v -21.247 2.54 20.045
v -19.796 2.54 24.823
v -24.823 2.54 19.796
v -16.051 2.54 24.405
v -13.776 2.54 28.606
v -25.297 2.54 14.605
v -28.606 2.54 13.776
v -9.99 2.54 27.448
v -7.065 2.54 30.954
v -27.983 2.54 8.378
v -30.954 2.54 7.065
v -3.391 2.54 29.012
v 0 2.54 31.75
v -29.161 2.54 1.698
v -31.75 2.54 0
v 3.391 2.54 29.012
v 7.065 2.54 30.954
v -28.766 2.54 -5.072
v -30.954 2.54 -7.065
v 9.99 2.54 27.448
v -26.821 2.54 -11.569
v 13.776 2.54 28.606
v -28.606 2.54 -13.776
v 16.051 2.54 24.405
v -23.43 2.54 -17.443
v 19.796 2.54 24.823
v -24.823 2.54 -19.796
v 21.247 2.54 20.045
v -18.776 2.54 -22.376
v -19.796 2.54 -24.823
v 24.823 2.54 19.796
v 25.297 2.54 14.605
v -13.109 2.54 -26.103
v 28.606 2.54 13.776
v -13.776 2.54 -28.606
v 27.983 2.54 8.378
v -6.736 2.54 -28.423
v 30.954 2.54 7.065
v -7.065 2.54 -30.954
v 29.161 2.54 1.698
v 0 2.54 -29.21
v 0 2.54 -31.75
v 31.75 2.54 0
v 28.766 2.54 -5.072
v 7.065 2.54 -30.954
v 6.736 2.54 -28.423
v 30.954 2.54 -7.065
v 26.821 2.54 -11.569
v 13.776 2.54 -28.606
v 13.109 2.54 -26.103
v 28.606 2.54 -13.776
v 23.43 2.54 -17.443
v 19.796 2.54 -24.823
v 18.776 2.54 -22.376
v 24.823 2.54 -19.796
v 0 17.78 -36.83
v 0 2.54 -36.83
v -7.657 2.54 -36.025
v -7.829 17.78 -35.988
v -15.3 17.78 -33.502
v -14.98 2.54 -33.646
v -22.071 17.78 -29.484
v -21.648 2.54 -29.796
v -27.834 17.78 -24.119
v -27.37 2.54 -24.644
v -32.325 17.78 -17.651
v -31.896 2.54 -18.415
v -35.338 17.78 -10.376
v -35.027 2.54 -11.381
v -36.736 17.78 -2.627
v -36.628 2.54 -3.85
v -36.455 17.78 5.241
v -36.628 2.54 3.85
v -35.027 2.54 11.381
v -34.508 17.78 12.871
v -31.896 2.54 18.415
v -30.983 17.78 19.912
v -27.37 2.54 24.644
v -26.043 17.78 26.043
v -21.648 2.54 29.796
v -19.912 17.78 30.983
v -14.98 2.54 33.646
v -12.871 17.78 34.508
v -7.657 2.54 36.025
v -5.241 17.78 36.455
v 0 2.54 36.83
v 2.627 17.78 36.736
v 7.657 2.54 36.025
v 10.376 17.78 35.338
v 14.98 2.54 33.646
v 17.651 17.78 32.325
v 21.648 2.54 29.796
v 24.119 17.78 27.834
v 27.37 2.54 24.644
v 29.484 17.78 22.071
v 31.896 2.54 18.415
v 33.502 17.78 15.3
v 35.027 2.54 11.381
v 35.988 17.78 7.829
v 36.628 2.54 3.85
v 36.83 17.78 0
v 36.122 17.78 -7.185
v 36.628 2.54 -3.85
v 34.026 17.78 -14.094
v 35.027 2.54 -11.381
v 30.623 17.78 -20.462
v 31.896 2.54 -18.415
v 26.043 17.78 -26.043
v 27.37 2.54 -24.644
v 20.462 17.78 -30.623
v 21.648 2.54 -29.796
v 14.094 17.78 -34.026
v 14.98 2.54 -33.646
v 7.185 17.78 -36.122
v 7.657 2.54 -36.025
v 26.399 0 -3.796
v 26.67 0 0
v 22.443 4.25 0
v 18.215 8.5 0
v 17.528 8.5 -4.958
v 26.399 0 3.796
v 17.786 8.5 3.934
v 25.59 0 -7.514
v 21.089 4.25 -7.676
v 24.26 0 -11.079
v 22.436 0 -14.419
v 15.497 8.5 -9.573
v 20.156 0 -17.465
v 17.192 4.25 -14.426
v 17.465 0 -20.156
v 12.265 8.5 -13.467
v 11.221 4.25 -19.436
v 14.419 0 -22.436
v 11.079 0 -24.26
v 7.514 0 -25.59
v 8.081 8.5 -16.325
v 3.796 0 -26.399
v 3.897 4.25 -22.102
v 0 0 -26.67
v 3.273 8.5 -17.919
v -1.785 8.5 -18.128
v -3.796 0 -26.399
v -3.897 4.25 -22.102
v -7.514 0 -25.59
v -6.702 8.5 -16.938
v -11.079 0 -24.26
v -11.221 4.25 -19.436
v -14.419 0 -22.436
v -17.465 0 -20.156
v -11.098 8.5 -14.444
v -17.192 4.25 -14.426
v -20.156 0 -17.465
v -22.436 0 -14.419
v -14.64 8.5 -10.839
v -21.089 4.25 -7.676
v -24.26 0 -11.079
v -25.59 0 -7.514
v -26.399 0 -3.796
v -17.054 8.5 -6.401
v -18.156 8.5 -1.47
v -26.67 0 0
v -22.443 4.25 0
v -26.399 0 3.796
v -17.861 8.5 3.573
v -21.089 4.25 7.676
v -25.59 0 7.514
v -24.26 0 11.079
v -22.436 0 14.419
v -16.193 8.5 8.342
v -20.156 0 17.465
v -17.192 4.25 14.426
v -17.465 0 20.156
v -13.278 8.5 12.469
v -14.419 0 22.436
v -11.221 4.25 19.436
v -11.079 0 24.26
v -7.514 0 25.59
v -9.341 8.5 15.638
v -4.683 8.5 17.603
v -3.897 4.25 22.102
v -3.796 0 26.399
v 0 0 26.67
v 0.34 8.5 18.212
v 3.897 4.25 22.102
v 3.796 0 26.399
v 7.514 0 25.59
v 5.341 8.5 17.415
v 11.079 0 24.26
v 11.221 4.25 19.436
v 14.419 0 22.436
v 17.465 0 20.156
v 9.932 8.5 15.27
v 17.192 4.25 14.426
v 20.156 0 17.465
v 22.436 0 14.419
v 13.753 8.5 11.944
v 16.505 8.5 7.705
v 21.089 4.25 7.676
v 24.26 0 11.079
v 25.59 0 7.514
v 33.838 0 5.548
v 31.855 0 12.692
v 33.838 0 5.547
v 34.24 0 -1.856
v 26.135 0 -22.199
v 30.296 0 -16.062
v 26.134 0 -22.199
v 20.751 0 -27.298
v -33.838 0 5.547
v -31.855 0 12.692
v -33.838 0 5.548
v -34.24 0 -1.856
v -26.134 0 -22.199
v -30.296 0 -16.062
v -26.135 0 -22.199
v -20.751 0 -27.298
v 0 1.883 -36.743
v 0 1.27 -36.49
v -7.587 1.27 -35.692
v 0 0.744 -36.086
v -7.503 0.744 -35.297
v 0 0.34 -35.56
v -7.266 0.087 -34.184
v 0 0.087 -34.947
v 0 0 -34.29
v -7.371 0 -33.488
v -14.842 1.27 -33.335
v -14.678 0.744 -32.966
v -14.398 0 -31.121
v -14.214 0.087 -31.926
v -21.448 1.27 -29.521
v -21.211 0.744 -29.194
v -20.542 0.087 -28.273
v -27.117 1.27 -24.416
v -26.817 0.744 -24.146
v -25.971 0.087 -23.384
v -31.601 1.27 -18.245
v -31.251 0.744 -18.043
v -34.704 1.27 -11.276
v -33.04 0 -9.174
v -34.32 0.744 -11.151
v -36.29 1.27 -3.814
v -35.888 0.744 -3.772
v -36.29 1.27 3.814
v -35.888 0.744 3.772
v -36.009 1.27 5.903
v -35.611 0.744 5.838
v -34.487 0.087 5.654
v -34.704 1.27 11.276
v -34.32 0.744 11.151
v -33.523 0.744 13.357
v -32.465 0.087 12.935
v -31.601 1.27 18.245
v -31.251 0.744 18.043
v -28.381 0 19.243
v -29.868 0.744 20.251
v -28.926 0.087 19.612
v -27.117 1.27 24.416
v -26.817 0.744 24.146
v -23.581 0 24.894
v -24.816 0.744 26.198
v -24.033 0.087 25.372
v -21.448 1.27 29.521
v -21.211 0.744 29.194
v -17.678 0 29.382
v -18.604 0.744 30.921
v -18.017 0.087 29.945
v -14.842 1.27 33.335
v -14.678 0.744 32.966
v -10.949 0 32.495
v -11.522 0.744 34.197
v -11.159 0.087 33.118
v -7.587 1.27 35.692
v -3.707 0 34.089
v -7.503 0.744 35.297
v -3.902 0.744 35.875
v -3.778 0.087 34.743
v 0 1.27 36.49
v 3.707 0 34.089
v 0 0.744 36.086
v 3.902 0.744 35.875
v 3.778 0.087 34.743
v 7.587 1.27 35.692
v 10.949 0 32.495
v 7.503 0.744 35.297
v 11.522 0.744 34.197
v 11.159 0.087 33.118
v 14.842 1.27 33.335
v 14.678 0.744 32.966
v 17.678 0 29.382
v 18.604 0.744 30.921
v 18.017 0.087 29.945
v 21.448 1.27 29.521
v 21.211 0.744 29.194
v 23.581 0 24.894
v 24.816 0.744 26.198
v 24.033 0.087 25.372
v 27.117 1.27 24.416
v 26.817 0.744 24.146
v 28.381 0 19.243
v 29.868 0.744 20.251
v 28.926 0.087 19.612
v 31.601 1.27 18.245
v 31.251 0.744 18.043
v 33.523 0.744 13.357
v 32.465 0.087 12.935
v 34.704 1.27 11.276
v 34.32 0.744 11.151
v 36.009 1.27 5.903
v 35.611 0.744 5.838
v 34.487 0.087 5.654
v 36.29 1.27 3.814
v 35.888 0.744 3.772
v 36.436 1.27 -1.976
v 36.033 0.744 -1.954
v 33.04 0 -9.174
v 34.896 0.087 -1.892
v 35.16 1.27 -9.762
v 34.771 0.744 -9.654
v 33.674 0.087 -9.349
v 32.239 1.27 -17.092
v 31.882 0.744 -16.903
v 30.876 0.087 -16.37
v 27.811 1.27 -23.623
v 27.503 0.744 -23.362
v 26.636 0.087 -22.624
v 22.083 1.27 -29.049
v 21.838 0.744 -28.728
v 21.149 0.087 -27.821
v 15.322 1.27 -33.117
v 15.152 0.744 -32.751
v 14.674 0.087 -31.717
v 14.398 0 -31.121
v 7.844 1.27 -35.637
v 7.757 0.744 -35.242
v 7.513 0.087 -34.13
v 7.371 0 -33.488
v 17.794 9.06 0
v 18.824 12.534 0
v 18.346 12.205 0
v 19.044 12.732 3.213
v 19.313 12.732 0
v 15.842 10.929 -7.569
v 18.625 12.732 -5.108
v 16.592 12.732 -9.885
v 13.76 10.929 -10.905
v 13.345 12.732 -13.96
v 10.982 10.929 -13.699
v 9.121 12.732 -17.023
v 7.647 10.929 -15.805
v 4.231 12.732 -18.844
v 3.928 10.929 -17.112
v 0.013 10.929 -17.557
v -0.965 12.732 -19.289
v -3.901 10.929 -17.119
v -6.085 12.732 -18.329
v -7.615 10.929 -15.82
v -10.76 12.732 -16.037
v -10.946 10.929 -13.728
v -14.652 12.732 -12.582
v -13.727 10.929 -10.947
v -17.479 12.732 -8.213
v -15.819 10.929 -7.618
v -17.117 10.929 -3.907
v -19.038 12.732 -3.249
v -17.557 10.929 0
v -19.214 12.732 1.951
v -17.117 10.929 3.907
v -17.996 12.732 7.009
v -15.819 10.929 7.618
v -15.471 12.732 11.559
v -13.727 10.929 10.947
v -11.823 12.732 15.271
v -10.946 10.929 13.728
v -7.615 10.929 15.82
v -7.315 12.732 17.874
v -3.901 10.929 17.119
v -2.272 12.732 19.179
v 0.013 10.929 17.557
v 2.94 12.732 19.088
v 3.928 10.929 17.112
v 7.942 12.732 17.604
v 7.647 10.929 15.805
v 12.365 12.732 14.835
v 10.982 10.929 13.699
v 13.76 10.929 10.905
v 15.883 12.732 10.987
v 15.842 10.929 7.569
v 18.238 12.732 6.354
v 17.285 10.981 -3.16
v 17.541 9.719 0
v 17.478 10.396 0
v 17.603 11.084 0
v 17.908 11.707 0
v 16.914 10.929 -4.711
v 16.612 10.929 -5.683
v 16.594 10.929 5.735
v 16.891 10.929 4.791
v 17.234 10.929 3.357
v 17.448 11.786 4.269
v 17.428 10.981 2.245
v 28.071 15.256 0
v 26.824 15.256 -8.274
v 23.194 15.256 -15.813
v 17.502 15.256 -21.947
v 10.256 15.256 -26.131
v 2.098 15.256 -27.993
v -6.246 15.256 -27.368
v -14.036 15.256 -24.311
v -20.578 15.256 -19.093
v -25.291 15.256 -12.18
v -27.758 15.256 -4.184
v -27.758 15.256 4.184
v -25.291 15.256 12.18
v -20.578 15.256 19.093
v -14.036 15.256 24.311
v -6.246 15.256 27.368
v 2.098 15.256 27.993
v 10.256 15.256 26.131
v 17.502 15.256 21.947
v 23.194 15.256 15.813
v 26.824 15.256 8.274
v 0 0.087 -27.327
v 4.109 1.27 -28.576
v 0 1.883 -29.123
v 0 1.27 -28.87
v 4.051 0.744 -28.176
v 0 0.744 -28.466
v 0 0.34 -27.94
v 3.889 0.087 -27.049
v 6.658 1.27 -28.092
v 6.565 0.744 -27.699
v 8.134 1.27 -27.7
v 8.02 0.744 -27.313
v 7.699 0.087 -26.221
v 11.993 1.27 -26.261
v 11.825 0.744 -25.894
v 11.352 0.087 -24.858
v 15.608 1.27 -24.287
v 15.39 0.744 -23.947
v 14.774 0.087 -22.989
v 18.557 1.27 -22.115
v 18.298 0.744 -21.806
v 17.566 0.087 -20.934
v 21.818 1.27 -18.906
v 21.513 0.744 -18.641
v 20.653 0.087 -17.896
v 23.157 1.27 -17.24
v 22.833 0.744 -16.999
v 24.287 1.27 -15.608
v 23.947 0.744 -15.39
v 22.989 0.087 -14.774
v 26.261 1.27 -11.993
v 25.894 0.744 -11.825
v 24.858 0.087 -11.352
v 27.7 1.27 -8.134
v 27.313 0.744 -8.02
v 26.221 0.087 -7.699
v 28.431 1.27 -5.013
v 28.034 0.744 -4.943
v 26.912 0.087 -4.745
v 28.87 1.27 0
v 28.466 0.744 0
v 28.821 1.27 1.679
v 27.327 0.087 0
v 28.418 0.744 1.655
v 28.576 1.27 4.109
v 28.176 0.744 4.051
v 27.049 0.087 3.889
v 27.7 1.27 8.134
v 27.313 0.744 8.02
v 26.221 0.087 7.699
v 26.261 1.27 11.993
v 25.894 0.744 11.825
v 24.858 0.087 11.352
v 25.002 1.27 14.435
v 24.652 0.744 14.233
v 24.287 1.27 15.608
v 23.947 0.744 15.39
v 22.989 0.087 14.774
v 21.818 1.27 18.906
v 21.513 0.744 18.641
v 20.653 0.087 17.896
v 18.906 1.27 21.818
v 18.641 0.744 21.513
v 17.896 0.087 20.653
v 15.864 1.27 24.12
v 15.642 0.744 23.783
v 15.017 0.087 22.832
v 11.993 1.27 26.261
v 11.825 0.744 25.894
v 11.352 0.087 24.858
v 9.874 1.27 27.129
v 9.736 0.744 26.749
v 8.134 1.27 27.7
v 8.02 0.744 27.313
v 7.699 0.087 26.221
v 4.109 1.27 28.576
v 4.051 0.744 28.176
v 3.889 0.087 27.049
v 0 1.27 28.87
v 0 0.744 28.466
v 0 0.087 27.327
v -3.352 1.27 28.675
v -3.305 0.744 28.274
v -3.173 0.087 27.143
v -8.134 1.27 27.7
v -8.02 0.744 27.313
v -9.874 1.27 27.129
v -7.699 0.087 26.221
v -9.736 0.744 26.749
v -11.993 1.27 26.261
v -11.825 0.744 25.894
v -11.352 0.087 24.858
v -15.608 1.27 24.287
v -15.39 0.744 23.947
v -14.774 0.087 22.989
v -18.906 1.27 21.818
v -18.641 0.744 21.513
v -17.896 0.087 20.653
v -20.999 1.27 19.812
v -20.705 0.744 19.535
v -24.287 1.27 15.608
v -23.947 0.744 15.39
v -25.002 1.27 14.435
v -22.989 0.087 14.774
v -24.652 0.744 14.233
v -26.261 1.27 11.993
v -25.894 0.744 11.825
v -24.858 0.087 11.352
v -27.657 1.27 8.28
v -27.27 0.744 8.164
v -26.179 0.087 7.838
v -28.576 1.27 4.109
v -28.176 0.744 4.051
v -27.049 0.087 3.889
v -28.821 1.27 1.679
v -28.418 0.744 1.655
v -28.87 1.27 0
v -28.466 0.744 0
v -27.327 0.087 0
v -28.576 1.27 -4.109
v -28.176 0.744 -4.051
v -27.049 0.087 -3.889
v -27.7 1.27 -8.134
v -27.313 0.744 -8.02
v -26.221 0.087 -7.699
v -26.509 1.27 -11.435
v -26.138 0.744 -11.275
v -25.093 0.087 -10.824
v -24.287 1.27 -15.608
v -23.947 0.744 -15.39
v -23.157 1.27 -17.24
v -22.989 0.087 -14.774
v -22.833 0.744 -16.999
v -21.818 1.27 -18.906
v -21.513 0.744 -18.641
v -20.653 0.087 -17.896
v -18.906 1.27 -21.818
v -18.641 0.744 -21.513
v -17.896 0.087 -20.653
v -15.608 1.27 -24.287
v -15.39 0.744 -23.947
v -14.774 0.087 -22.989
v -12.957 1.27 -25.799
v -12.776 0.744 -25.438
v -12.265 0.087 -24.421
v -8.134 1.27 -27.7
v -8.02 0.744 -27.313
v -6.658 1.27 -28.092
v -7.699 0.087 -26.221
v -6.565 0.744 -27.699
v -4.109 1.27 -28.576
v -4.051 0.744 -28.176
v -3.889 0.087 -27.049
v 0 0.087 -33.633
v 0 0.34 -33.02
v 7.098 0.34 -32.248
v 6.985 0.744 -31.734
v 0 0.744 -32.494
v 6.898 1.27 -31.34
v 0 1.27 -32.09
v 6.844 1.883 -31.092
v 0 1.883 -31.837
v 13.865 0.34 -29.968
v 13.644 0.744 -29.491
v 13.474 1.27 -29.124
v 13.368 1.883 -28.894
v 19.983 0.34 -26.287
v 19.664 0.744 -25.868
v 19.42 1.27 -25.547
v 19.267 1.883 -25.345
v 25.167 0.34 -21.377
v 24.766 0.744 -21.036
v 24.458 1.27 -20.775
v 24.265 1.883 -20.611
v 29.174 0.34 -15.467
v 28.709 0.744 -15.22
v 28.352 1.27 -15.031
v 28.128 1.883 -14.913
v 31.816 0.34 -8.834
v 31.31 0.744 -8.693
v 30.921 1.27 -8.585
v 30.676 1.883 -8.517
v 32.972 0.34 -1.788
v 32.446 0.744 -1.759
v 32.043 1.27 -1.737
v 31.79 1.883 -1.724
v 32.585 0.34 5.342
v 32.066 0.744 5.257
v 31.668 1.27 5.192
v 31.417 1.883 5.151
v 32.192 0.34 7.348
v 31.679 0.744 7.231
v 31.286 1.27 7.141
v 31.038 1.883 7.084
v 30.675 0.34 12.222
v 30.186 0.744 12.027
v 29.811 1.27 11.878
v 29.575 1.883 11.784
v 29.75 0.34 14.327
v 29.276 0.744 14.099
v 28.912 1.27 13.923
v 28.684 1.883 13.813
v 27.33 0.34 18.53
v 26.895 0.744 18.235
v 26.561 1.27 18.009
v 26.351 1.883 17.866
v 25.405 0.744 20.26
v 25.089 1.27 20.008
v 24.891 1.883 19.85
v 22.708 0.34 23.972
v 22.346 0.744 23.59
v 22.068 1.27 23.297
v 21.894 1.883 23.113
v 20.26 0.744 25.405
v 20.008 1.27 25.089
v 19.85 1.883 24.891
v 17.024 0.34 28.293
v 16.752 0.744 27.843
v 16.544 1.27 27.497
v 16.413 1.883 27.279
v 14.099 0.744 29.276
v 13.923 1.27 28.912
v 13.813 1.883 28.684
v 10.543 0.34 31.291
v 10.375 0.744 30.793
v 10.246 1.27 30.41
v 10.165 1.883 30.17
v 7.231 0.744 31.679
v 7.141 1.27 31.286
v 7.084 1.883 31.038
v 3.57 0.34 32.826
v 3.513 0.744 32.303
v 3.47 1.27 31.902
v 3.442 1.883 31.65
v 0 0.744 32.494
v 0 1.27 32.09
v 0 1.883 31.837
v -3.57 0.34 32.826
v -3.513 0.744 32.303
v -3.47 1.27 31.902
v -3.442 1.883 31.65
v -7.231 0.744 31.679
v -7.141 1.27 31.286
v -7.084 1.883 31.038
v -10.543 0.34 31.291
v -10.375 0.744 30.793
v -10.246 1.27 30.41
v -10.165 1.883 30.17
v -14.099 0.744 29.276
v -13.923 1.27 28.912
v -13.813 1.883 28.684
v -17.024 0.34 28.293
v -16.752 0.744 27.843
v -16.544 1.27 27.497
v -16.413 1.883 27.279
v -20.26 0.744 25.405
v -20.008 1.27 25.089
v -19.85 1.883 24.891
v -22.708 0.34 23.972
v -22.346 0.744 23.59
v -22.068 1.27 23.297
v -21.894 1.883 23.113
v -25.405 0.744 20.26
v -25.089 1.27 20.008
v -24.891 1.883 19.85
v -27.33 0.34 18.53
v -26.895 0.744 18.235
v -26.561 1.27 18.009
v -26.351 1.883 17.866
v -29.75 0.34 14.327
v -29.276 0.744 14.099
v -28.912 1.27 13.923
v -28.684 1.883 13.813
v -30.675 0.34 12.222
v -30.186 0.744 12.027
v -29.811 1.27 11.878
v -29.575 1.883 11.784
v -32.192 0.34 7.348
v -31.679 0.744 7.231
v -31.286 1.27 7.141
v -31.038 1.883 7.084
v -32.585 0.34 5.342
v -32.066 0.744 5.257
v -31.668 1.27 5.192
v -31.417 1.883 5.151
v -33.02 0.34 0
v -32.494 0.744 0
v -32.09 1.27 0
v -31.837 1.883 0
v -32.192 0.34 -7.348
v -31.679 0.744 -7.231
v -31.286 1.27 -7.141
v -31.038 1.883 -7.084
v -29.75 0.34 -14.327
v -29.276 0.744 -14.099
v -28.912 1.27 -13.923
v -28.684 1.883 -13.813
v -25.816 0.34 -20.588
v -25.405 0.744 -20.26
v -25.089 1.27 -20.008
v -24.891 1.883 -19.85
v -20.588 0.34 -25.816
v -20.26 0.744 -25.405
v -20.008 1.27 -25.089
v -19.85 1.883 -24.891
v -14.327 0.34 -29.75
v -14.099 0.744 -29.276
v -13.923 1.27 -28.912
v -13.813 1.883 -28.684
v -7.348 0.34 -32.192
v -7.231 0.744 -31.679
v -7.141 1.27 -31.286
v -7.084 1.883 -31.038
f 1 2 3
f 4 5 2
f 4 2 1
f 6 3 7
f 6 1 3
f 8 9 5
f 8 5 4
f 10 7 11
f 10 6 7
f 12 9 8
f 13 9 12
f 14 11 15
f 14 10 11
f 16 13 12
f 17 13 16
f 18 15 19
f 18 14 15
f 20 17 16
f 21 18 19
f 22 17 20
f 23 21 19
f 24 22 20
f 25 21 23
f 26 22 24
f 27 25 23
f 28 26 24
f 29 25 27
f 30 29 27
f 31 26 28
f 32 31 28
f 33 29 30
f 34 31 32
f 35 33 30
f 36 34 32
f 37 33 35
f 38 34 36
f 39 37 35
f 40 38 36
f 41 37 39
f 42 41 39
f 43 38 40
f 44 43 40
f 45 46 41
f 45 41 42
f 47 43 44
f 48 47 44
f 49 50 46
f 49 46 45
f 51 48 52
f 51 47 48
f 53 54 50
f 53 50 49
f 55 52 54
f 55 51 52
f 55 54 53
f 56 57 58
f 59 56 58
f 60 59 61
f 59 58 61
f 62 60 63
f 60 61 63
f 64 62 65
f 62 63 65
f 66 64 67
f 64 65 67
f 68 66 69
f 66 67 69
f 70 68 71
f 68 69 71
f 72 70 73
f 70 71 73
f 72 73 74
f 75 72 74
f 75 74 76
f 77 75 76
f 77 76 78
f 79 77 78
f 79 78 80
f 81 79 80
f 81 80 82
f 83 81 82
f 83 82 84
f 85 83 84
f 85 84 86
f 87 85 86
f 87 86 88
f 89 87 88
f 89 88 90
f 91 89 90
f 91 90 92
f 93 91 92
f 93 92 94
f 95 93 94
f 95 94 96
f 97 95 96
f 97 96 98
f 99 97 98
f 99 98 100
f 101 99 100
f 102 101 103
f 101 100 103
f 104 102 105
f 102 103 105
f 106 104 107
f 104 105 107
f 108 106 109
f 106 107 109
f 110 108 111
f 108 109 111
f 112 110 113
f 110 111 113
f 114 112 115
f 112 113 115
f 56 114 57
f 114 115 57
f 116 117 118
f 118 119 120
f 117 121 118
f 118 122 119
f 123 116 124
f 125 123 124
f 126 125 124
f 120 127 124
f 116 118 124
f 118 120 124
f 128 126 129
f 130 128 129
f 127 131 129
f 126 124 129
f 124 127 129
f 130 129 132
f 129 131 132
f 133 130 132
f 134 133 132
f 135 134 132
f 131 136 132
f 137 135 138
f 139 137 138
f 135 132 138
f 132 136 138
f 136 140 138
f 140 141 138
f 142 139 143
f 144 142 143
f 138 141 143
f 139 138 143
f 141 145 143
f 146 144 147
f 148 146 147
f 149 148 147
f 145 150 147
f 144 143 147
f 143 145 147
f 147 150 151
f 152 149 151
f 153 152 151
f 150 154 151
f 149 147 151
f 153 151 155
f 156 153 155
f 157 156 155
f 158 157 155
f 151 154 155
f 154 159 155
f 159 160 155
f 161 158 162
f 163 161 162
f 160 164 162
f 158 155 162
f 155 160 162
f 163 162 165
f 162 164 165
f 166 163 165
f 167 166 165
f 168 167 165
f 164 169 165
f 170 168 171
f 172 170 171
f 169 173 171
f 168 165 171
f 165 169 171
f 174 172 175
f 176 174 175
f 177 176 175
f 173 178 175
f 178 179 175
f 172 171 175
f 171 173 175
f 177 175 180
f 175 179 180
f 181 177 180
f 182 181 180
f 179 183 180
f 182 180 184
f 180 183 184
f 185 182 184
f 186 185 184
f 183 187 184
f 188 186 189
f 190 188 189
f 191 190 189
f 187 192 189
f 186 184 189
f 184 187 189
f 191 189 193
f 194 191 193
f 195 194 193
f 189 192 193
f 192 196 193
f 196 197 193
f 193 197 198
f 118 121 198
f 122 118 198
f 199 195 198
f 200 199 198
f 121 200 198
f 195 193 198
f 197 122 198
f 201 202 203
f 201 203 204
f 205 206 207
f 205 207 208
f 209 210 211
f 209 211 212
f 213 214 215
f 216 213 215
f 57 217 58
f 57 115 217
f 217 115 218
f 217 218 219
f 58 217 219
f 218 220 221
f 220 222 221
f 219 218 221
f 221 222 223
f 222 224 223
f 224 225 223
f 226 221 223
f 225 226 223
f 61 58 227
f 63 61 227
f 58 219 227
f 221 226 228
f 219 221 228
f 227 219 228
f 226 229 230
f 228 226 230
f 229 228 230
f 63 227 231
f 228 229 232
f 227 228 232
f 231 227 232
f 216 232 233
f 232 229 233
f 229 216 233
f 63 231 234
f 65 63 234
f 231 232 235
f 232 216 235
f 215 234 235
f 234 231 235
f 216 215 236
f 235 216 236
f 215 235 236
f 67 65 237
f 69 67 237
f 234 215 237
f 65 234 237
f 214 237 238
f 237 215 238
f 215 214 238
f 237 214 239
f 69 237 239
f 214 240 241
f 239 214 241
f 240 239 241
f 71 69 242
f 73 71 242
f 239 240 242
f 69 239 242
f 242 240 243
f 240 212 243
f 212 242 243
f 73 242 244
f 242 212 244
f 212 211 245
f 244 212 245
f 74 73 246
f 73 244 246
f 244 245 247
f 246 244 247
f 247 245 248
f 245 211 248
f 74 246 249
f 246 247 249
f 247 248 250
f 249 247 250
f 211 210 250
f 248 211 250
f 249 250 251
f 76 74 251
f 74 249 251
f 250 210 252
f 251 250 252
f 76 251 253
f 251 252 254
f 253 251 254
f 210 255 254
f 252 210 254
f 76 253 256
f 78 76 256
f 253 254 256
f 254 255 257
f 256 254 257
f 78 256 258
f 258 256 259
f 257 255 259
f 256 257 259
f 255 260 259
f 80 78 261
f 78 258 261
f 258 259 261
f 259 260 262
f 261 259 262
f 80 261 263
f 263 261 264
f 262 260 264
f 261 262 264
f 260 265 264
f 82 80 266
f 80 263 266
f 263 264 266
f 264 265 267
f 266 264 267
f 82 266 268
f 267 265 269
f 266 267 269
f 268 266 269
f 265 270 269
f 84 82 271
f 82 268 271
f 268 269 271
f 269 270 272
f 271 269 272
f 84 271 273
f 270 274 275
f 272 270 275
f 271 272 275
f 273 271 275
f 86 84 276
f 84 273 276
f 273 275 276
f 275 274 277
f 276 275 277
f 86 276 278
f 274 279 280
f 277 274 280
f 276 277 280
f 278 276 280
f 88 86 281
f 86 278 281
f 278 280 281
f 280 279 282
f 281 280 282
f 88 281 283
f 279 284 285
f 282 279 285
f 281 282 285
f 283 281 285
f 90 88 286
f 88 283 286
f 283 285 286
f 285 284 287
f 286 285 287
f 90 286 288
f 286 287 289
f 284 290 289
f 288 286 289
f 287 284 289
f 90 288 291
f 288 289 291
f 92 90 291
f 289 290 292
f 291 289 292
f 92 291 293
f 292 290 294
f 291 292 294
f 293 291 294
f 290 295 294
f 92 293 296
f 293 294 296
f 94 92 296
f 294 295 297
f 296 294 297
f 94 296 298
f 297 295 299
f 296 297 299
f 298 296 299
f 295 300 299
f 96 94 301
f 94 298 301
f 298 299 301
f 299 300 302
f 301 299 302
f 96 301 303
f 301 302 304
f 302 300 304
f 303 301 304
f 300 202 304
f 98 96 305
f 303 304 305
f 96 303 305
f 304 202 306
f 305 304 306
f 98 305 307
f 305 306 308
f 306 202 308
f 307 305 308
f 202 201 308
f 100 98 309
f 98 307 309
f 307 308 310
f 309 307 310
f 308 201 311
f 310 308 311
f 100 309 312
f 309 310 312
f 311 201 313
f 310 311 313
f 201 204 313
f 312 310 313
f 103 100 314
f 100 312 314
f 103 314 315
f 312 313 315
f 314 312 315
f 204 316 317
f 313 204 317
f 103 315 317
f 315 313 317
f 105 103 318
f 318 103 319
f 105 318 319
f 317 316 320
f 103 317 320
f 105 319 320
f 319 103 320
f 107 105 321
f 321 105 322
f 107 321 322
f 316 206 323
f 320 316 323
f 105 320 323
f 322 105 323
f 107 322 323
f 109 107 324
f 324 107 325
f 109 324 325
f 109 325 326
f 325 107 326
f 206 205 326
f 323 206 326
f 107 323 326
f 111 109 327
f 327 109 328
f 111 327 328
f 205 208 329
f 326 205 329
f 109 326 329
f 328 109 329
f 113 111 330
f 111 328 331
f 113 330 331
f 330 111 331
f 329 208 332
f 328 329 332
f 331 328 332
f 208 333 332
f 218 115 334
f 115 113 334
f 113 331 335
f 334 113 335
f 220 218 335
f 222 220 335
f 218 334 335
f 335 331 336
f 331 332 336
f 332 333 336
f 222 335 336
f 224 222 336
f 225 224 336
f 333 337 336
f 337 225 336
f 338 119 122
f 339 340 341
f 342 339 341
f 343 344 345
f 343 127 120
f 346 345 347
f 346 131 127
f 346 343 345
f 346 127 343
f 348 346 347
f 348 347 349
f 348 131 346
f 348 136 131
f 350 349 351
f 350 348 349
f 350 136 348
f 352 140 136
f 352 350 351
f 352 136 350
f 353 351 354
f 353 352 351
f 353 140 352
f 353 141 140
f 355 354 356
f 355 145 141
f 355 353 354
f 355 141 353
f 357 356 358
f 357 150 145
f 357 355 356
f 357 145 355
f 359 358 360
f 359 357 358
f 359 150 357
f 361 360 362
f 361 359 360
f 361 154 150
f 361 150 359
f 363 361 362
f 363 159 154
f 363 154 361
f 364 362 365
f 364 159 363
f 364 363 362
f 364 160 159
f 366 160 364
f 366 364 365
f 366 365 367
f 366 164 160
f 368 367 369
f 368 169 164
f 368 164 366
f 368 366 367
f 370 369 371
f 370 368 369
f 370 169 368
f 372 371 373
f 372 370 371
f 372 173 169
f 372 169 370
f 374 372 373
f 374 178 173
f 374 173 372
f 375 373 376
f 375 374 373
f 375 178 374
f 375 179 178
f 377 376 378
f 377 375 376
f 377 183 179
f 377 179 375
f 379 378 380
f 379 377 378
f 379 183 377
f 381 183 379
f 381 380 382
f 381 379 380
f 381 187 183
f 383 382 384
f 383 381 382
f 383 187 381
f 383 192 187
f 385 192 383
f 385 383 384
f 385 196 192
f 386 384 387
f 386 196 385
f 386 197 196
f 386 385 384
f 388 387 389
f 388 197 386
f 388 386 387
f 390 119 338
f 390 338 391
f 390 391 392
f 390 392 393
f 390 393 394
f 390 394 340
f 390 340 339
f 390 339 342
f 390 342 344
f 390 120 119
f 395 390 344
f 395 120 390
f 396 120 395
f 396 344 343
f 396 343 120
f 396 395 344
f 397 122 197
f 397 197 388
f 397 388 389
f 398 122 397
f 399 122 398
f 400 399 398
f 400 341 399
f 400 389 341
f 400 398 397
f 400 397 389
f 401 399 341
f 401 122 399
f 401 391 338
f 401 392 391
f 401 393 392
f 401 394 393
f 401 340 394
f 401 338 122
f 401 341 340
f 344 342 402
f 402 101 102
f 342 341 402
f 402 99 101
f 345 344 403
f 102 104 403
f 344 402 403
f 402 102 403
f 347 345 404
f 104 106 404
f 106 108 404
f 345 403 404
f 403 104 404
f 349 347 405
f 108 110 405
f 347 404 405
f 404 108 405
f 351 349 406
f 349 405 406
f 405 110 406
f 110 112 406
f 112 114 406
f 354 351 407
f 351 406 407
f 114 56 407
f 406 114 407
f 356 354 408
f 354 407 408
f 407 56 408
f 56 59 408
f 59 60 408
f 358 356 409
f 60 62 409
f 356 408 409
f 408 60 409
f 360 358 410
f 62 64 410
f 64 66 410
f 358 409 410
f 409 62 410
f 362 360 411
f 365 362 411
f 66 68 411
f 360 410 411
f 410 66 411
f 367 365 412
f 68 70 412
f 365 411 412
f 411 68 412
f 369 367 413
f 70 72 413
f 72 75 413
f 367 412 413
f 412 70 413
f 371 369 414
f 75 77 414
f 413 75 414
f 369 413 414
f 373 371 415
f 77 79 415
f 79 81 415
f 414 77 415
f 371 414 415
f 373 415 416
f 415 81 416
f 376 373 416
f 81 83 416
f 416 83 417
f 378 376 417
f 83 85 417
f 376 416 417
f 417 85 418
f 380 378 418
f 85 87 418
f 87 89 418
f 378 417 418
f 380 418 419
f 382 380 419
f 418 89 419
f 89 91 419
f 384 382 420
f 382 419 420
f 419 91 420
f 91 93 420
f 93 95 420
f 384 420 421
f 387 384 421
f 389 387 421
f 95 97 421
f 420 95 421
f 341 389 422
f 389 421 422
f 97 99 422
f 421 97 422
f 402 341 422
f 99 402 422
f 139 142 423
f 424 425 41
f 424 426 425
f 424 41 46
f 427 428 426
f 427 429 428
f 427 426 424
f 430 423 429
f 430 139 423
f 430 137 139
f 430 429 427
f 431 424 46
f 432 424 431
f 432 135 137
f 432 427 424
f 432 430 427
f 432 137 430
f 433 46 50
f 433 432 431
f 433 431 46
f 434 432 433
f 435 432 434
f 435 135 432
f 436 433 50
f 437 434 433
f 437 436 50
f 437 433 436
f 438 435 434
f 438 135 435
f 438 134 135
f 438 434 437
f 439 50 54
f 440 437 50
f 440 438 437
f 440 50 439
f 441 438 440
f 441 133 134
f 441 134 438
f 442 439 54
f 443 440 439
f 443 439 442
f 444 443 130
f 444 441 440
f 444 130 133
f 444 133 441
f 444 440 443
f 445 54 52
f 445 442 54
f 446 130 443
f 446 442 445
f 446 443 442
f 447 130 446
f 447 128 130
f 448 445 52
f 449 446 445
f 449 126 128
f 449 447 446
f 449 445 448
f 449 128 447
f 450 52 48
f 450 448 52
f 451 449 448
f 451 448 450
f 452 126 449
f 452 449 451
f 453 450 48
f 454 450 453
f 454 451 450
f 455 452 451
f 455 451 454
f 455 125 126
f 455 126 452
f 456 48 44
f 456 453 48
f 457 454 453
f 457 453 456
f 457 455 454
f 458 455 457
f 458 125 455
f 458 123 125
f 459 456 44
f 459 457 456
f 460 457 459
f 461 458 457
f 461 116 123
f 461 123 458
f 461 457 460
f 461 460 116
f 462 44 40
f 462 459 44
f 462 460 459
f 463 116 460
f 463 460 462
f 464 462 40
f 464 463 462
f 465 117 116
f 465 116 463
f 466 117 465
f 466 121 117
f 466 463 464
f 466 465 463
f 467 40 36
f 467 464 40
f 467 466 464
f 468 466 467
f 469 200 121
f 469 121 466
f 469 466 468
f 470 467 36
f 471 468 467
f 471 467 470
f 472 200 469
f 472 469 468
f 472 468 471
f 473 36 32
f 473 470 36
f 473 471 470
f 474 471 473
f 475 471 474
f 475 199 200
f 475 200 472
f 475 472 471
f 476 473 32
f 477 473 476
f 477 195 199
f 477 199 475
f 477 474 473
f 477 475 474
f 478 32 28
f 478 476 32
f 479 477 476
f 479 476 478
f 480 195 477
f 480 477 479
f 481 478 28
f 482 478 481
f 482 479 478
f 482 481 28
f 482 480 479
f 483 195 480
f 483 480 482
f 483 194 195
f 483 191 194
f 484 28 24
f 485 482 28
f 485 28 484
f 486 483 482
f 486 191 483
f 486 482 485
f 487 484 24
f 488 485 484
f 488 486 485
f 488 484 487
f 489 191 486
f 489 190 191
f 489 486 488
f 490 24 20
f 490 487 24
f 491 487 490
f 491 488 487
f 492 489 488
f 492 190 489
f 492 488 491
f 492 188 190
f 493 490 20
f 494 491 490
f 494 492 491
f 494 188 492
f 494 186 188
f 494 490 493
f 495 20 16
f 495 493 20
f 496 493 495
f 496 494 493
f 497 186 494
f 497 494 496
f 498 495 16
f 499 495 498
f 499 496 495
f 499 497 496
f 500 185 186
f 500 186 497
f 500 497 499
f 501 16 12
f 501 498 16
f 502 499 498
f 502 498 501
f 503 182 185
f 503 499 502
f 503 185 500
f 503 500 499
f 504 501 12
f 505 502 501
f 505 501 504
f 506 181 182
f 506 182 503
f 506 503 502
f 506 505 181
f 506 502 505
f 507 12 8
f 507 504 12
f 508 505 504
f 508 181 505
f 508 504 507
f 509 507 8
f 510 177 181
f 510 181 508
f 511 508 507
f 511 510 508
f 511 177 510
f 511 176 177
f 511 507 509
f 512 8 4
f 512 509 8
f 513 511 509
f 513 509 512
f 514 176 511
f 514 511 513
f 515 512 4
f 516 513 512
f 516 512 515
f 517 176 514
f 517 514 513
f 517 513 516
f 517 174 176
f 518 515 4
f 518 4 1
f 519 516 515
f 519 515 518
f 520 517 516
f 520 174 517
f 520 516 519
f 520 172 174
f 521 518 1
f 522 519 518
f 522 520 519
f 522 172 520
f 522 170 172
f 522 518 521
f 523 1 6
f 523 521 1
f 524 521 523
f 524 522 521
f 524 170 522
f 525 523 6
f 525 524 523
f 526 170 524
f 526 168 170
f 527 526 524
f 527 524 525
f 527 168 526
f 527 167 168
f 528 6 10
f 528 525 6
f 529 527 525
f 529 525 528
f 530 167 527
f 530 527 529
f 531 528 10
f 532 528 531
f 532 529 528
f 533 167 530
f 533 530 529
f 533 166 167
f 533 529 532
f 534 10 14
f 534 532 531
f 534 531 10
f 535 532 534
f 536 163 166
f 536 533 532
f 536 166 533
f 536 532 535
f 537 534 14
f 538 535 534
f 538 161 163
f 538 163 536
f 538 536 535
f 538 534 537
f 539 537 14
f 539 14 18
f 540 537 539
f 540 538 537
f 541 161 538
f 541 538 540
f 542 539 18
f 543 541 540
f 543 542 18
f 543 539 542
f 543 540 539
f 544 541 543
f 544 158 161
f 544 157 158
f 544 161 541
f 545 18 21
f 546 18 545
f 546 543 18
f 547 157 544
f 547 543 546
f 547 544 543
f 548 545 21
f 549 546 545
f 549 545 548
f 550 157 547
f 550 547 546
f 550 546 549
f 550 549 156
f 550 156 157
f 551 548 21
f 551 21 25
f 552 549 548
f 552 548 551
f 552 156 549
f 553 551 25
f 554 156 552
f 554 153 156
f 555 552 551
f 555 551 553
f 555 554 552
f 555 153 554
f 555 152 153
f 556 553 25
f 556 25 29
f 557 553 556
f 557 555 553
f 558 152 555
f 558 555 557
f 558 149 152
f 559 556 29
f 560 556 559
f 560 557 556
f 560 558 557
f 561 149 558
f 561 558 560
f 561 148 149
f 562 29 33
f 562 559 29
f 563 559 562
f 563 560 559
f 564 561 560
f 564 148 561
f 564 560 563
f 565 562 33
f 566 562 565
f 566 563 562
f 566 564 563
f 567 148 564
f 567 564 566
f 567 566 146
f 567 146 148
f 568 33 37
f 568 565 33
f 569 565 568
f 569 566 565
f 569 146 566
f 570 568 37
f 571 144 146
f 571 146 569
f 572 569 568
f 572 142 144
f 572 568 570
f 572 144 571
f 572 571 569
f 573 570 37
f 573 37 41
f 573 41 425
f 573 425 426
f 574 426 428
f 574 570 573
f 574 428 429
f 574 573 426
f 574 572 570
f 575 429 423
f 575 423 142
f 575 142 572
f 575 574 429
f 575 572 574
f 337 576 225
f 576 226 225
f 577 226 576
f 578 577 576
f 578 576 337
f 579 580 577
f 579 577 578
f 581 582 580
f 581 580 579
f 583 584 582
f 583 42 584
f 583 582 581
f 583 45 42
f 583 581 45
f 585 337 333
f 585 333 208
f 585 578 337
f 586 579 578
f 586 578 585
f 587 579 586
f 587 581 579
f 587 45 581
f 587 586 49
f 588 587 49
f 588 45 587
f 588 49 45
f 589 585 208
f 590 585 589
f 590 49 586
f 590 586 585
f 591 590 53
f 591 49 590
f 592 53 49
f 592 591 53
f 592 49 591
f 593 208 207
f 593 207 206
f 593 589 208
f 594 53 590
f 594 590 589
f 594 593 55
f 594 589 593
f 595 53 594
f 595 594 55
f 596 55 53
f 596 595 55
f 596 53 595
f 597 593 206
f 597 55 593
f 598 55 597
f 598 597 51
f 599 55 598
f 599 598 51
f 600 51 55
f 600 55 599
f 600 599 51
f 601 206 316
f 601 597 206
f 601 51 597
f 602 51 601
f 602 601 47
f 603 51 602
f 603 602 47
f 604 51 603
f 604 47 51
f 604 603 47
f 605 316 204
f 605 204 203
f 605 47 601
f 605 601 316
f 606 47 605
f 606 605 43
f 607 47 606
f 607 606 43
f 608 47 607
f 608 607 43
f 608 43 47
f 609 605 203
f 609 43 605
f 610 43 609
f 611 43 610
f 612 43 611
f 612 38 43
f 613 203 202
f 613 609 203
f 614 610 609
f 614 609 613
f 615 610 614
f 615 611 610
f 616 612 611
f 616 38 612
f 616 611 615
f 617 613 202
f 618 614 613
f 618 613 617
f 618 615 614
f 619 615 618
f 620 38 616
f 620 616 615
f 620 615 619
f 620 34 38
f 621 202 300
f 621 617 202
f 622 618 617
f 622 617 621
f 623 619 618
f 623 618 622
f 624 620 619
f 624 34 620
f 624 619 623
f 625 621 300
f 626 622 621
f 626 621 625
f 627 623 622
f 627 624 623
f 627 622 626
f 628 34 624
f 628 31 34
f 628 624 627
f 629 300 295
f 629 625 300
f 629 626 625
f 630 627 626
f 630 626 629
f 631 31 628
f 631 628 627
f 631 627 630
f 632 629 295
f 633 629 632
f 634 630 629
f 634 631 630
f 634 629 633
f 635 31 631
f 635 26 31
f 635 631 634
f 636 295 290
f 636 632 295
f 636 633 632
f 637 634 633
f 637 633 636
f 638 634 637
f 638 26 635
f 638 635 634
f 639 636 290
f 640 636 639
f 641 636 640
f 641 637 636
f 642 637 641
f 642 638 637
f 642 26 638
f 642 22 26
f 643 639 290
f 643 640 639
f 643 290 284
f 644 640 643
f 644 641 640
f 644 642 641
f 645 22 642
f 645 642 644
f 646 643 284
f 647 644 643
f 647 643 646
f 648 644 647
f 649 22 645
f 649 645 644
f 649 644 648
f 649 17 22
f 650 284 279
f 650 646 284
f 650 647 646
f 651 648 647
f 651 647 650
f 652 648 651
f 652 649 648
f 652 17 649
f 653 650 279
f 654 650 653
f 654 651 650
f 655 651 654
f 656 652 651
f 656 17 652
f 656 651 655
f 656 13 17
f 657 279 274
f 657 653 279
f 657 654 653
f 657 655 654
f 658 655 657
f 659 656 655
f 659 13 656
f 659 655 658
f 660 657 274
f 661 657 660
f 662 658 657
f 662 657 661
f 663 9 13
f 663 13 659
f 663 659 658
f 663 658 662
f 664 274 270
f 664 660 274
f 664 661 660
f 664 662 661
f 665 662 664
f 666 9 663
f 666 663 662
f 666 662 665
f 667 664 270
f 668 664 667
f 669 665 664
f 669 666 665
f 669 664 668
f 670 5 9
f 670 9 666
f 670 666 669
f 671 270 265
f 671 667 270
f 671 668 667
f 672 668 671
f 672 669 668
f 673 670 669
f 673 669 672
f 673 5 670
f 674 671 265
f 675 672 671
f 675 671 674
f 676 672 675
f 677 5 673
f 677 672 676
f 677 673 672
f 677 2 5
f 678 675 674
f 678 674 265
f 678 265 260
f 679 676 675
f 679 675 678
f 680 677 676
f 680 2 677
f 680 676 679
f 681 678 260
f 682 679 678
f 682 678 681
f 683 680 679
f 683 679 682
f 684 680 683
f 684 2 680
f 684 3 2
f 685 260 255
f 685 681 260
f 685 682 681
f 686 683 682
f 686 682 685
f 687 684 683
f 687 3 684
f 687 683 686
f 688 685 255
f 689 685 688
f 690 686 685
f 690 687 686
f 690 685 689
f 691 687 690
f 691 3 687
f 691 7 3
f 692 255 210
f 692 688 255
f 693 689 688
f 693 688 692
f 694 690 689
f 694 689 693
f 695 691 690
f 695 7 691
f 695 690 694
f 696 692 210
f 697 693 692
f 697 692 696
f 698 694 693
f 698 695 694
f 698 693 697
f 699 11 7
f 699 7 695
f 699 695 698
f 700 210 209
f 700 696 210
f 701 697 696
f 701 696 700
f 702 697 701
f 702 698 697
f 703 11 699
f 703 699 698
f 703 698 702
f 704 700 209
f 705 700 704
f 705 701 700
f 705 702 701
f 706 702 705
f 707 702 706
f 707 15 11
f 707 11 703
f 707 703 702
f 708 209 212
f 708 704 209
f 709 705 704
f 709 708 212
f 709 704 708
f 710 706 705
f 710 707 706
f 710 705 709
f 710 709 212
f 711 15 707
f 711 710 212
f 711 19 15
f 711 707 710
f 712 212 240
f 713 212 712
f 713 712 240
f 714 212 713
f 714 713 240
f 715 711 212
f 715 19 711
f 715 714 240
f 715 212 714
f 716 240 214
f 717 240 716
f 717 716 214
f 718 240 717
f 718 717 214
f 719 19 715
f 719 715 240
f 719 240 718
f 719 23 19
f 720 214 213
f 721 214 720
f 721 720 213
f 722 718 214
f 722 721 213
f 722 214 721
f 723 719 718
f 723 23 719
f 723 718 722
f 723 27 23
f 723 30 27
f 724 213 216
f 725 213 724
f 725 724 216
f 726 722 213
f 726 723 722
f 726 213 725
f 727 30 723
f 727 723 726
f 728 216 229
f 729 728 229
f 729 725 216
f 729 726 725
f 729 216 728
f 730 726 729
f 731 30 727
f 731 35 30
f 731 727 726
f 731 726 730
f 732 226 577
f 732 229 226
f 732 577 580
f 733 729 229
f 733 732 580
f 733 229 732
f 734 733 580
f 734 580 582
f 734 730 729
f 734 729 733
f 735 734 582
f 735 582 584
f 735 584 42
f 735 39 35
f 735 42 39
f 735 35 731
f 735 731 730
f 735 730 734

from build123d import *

# Parameters (mm, degrees)
SKETCH1_R           = 36.83
BOSS_EXTRUDE1_DEPTH = 17.78
FILLET1_R           = 2.54
SKETCH2_R           = 26.67
SKETCH3_R           = 14.7955
SKETCH4_R           = 14.7955
CUT_EXTRUDE1_DEPTH  = 76.2
SKETCH7_R           = 14.7955
SKETCH6_R           = 36.83
SKETCH8_R           = 31.75
SKETCH8_R_2         = 29.21
CUT_EXTRUDE2_DEPTH  = 2.54
FILLET3_R           = 2.54
FILLET4_R           = 2.54
FILLET5_R           = 2.54


with BuildPart() as part:
    # Sketch1 → Boss-Extrude1 (new body)
    with BuildSketch(Plane(origin=(0, 0, 0), x_dir=(1, 0, 0), z_dir=(0, 1, 0))):
        with Locations(Location((0, 0, 0), (0, 0, 90))):
            Circle(SKETCH1_R)
    extrude(amount=BOSS_EXTRUDE1_DEPTH)

    # Fillet1
    fillet1_edges = [part.edges().sort_by_distance(p)[0] for p in [
        (0, 0, 36.83),
    ]]
    fillet(fillet1_edges, radius=FILLET1_R)

    # Sketch2 → Cut-Loft1 section 0
    with BuildSketch(Plane(origin=(0, 0, 0), x_dir=(1, 0, 0), z_dir=(0, 1, 0))):
        Circle(SKETCH2_R)
    # Sketch3 → Cut-Loft1 section 1
    with BuildSketch(Plane(origin=(0, 11.938, 0), x_dir=(1, 0, 0), z_dir=(0, 1, 0))):
        Circle(SKETCH3_R)
    loft(mode=Mode.SUBTRACT)

    # Sketch4 → Cut-Extrude1 (cut)
    with BuildSketch(Plane.XZ.offset(-11.938)):
        with Locations(Location((0, 0, 0), (0, 0, 270))):
            Circle(SKETCH4_R)
    extrude(amount=-CUT_EXTRUDE1_DEPTH, mode=Mode.SUBTRACT)

    # Sketch7 → Cut-Loft2 section 0
    with BuildSketch(Plane(origin=(0, 11.43, 0), x_dir=(1, 0, 0), z_dir=(0, 1, 0))):
        Circle(SKETCH7_R)
    # Sketch6 → Cut-Loft2 section 1
    with BuildSketch(Plane(origin=(0, 17.78, 0), x_dir=(1, 0, 0), z_dir=(0, 1, 0))):
        Circle(SKETCH6_R)
    loft(mode=Mode.SUBTRACT)

    # Sketch8 → Cut-Extrude2 (cut)
    with BuildSketch(Plane.XZ):
        with Locations(Location((0, 0, 0), (0, 0, 270))):
            Circle(SKETCH8_R)
        with Locations(Location((0, 0, 0), (0, 0, 270))):
            Circle(SKETCH8_R_2, mode=Mode.SUBTRACT)
    extrude(amount=-CUT_EXTRUDE2_DEPTH, mode=Mode.SUBTRACT)

    # Fillet3
    fillet3_edges = [part.edges().sort_by_distance(p)[0] for p in [
        (0, 0, 31.75),
    ]]
    fillet(fillet3_edges, radius=FILLET3_R - 0.0001)  # a hair under: the kernel refuses the full size

    # Fillet4
    fillet4_edges = [part.edges().sort_by_distance(p)[0] for p in [
        (0, 0, 29.21),
    ]]
    fillet(fillet4_edges, radius=FILLET4_R - 0.0001)  # a hair under: the kernel refuses the full size

    # Fillet5
    fillet5_edges = [part.edges().sort_by_distance(p)[0] for p in [
        (-15.18822317, 11.543176706, 0),
    ]]
    fillet(fillet5_edges, radius=FILLET5_R)


solid = part.part
